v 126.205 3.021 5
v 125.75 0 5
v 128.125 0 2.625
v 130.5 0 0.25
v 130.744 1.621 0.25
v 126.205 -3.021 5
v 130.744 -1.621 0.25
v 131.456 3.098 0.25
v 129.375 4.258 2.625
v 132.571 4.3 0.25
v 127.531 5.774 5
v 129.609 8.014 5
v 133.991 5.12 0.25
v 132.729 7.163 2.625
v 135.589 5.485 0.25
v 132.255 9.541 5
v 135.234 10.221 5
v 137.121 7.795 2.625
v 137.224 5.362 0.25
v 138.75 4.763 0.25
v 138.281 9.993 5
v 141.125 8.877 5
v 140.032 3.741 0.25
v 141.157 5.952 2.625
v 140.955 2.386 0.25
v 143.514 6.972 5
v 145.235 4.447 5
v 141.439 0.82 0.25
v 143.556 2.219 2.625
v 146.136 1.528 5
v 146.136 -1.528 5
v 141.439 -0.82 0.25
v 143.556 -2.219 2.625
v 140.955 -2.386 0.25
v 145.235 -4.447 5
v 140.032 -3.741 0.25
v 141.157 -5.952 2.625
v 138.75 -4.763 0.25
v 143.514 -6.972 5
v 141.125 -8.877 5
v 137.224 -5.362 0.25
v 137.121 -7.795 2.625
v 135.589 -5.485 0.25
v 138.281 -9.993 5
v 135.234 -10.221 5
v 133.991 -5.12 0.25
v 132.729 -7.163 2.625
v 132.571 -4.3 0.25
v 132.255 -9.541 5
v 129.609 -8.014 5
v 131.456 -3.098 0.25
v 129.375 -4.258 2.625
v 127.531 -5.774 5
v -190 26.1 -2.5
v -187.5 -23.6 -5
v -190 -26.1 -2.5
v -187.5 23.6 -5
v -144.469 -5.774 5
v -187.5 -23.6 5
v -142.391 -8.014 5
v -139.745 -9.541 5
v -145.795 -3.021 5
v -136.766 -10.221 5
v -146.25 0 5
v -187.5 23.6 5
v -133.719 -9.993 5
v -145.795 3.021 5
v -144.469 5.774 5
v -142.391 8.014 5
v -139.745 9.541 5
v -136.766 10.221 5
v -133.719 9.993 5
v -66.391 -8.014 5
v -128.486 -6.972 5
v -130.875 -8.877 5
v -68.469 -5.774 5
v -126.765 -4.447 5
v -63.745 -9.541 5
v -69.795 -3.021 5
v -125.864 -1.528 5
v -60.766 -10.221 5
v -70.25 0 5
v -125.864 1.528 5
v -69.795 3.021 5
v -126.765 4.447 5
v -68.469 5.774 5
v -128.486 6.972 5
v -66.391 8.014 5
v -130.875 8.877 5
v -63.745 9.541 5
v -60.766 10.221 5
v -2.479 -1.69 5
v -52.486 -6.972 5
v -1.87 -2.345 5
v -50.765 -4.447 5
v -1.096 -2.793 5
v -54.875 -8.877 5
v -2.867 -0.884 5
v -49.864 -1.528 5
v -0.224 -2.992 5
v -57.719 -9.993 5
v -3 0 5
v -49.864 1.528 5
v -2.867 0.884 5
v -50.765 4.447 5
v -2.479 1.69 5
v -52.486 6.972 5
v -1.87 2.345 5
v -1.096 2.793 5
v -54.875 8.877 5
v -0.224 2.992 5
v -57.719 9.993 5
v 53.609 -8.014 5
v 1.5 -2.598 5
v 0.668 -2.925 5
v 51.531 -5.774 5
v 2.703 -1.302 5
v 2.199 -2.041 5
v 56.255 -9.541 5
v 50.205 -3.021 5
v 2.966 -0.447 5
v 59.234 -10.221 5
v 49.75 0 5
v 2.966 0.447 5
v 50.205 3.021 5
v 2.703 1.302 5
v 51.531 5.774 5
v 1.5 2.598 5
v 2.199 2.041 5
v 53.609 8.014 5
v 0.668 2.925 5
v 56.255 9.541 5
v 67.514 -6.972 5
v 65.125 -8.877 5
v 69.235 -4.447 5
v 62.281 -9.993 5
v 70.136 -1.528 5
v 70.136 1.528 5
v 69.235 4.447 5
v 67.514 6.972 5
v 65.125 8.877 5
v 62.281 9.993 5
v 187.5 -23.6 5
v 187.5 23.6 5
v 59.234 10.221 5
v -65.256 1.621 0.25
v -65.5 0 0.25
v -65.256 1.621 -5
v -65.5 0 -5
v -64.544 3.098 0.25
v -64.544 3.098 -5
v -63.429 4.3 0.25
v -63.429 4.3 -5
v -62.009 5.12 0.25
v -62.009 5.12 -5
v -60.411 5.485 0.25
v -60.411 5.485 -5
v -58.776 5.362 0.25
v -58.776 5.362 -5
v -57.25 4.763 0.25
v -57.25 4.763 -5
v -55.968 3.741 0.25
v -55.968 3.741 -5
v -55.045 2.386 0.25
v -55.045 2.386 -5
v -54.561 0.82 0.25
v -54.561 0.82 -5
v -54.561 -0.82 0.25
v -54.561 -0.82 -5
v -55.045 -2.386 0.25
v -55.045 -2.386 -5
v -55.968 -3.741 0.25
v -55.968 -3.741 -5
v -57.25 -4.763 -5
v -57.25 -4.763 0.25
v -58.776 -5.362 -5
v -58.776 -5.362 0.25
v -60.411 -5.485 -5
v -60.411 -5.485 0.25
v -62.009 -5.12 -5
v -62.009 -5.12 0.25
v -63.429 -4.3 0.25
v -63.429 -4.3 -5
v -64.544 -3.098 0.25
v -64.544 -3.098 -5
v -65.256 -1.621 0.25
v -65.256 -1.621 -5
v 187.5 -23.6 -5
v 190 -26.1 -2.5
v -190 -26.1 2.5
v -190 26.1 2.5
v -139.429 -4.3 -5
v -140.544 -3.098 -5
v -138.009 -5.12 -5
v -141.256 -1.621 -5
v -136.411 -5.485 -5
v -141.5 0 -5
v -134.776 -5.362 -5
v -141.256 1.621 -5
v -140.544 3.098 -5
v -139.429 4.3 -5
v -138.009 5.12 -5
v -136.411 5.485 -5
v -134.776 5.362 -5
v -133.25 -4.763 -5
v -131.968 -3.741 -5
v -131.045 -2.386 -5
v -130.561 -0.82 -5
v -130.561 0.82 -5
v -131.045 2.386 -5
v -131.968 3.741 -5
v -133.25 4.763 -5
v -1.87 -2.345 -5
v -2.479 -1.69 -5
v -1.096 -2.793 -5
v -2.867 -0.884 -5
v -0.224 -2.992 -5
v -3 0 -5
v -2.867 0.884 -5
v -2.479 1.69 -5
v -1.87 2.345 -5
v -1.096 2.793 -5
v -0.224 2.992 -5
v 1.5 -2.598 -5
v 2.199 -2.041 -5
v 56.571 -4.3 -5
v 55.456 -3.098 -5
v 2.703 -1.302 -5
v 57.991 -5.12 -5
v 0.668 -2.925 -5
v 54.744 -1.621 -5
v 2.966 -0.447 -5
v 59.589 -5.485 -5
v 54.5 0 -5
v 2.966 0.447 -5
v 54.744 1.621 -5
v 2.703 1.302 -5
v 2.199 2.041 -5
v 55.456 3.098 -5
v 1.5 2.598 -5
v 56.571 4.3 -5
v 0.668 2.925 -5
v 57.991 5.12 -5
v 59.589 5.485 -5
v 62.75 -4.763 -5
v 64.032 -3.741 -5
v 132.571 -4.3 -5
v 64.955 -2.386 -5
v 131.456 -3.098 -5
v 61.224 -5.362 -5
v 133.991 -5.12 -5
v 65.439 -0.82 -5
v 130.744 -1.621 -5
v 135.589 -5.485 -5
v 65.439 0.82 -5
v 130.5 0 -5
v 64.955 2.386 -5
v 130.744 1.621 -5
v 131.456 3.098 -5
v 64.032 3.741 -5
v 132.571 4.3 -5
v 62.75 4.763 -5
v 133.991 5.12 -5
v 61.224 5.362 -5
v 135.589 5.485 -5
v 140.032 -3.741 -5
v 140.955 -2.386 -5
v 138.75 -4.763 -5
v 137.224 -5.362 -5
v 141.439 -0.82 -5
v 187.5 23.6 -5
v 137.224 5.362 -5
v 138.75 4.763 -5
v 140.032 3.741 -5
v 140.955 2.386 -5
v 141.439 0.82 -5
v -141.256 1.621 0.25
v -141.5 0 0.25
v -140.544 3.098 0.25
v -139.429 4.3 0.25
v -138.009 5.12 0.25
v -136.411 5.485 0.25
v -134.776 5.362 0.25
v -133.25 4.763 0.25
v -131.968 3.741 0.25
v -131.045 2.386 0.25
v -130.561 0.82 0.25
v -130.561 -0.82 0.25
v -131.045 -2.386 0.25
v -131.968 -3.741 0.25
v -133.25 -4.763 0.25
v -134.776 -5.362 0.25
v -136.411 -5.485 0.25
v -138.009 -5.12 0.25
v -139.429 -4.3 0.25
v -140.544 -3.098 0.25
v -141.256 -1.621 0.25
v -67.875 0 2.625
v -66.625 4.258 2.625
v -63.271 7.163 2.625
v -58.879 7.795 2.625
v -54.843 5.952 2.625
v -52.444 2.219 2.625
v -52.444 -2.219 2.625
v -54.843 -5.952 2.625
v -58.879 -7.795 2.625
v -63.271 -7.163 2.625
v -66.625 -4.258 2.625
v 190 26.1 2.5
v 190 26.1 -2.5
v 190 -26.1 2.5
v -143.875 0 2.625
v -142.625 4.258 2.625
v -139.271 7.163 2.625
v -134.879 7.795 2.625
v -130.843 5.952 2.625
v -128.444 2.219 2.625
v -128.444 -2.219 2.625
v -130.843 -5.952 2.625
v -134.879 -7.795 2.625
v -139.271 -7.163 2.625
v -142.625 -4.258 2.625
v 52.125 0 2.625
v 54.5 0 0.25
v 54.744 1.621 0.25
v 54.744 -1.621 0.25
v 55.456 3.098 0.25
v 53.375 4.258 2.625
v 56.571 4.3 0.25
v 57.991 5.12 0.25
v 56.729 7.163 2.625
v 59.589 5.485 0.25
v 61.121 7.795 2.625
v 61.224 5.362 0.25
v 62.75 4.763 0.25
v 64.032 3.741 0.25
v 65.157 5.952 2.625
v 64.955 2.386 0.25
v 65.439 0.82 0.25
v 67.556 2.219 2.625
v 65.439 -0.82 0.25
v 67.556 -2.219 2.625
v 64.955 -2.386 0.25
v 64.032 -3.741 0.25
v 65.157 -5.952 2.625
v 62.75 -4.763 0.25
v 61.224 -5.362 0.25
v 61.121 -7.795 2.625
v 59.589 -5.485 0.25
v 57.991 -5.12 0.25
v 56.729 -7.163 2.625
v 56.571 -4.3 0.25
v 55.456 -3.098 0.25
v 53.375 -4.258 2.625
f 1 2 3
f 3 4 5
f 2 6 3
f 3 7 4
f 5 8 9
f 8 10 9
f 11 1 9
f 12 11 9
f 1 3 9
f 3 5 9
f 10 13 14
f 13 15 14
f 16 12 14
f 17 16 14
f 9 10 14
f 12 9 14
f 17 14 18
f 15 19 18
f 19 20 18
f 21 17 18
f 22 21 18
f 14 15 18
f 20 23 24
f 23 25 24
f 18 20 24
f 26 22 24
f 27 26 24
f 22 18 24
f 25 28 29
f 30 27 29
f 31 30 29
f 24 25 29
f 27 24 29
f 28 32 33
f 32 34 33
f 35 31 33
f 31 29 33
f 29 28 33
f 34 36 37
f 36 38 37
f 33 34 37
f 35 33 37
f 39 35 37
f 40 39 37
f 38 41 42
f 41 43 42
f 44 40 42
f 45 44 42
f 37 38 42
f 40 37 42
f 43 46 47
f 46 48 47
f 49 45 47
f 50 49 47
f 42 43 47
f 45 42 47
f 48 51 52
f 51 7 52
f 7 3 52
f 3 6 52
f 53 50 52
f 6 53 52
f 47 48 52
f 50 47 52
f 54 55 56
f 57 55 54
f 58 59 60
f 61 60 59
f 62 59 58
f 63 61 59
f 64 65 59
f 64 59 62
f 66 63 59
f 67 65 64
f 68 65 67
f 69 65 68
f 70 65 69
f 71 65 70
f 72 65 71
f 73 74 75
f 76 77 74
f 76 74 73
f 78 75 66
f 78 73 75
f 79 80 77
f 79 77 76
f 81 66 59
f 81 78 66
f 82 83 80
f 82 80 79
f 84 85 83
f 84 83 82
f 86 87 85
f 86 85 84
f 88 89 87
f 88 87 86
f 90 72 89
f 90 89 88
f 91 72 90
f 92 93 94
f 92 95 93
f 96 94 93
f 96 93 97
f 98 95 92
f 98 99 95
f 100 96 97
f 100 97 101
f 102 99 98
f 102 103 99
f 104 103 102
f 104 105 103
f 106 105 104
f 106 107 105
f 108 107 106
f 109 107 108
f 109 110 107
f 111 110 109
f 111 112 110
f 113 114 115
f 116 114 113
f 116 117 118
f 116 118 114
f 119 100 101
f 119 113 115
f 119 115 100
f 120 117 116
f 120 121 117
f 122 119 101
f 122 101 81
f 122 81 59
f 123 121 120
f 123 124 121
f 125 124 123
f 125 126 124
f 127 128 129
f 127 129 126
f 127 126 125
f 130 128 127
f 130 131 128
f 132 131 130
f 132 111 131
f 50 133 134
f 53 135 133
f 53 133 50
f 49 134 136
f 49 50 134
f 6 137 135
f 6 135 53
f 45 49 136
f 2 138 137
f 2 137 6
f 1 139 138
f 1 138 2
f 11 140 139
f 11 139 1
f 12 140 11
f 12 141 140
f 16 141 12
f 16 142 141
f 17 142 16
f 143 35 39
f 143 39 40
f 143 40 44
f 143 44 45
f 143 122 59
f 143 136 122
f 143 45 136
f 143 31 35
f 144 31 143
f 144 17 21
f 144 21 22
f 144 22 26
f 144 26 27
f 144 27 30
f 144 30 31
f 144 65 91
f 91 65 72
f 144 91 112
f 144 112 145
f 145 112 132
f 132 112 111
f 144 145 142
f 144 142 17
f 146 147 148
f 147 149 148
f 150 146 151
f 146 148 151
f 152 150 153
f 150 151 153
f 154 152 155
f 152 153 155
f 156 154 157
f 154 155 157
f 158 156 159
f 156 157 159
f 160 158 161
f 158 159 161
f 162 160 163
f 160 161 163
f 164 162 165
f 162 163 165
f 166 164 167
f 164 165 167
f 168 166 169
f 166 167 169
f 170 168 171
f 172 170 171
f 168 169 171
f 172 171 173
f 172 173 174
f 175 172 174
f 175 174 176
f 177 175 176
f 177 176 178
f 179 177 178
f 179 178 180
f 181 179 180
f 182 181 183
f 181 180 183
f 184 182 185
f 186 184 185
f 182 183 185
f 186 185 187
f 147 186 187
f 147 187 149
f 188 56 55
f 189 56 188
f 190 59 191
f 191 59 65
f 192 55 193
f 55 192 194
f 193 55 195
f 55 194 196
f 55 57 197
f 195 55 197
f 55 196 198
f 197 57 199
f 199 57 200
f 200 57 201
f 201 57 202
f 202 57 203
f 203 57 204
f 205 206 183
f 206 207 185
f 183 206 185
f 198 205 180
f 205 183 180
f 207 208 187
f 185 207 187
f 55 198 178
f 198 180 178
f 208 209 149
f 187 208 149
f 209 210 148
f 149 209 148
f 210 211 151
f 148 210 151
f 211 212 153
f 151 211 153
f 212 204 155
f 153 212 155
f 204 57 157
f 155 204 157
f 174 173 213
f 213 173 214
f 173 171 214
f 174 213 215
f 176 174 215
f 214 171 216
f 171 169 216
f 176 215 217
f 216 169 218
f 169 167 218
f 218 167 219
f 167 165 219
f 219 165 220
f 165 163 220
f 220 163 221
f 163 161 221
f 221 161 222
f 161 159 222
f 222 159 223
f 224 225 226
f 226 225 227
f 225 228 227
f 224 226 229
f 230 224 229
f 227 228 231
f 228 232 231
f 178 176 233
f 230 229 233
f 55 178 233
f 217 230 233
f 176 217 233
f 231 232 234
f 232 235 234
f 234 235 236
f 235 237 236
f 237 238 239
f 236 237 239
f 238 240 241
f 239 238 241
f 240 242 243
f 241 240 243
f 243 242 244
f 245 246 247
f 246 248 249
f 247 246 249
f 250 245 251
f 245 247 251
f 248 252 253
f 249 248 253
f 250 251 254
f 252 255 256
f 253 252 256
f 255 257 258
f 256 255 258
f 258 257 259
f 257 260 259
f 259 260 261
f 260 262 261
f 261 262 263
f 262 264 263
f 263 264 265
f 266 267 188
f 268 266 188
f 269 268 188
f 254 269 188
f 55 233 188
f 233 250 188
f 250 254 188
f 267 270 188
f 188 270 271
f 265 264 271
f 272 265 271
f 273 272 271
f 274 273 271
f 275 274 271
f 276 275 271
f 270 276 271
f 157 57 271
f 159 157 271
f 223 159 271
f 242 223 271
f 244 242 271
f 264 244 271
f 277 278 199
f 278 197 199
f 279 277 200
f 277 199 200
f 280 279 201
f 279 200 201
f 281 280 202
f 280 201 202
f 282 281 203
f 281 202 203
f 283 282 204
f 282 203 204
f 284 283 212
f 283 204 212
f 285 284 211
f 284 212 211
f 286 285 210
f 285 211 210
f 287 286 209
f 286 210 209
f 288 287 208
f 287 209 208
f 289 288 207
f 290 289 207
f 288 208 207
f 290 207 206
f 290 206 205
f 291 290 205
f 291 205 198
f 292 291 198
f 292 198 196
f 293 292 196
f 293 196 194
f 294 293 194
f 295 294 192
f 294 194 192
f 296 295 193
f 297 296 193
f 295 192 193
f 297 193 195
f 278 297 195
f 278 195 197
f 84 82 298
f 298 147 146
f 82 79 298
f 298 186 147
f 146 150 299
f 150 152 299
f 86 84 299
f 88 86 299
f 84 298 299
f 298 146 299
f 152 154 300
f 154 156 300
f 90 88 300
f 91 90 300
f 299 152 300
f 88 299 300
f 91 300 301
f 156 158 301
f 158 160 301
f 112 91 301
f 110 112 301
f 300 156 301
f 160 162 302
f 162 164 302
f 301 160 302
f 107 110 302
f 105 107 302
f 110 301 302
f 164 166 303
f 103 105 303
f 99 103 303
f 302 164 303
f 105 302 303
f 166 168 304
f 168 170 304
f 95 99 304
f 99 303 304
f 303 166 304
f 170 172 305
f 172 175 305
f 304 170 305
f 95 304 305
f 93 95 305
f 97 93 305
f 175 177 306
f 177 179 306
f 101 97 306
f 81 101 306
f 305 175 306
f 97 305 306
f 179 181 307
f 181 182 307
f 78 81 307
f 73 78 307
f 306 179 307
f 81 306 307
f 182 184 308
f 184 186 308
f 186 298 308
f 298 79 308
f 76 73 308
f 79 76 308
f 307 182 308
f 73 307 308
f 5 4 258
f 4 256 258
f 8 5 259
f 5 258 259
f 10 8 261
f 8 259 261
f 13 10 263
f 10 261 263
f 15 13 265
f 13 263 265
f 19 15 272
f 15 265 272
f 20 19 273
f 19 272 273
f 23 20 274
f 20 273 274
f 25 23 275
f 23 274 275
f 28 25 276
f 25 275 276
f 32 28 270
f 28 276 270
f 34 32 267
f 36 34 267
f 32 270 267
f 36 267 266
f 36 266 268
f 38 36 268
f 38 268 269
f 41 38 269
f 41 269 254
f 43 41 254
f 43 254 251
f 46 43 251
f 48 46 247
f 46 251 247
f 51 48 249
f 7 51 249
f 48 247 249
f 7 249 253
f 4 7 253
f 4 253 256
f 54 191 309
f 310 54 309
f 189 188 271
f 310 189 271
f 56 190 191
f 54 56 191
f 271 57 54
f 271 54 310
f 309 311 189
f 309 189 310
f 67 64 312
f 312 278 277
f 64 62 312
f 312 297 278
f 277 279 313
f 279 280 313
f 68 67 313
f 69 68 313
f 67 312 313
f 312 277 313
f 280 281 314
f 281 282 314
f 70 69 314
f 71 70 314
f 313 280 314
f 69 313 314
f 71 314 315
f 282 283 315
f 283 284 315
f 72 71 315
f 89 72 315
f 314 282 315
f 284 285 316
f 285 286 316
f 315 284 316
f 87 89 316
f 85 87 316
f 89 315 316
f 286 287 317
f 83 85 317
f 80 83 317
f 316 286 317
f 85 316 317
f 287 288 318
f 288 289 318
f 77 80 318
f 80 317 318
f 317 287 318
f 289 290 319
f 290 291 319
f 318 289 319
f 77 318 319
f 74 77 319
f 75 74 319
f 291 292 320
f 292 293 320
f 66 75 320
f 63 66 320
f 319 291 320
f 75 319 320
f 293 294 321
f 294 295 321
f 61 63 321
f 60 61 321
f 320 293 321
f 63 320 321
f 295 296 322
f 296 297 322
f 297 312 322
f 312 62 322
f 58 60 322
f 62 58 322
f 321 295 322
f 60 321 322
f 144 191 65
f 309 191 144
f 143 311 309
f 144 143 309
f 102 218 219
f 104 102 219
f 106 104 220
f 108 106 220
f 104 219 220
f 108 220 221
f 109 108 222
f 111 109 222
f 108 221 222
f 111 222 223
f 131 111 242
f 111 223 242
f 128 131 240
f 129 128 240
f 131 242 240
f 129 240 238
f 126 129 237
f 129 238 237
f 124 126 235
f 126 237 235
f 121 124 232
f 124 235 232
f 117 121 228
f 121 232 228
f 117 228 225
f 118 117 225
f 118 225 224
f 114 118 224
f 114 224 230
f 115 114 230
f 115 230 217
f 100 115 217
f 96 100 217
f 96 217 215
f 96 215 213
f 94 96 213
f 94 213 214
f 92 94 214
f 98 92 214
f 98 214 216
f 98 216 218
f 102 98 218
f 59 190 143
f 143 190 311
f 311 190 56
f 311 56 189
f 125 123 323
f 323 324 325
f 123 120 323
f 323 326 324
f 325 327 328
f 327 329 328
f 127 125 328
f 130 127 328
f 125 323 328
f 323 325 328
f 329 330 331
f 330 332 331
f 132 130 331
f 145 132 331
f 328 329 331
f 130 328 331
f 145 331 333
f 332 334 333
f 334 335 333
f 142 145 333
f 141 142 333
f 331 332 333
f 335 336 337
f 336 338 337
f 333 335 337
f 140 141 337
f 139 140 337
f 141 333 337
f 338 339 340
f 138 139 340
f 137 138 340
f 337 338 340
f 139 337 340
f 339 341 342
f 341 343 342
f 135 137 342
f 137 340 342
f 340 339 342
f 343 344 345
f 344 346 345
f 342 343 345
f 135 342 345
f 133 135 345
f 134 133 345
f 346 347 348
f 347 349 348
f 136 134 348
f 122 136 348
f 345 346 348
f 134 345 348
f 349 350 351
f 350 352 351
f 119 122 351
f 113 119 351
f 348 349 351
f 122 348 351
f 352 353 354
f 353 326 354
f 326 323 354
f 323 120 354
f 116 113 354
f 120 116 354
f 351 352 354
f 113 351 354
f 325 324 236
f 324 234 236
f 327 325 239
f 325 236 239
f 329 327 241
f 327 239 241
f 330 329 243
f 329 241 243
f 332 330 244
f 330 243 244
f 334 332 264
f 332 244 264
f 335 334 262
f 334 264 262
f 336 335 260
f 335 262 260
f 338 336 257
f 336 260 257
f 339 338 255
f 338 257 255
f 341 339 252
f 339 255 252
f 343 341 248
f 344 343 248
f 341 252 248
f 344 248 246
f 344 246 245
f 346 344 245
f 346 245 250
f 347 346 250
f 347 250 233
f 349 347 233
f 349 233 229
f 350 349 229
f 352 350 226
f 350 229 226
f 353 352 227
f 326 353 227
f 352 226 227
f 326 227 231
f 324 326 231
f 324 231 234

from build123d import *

# Parameters (mm, degrees)
F0_W           = 380
F0_H           = 52.2
F1_DEPTH       = 5
F2_SIZE        = 2.5
F4_D           = 6
F5_D           = 11
F5_CSINK_D     = 20.5
F5_CSINK_ANGLE = 90


with BuildPart() as f1:
    # F0 (on Top) → F1 (new body, symmetric)
    with BuildSketch(Plane.XY):
        Rectangle(F0_W, F0_H)
    extrude(amount=F1_DEPTH, both=True)

    # F2
    f2_edges = [f1.edges().sort_by_distance(p)[0] for p in [
        (0, 26.1, 5),
        (-190, 0, 5),
        (0, -26.1, 5),
        (190, 0, 5),
        (0, 26.1, -5),
        (-190, 0, -5),
        (0, -26.1, -5),
        (190, 0, -5),
    ]]
    chamfer(f2_edges, length=F2_SIZE)

    # F4 (through all)
    with Locations(Plane.XY.offset(5)):
        with Locations((0, 0)):
            Hole(F4_D / 2)

    # F5 (through all)
    with Locations(Plane.XY.offset(5)):
        with Locations((-136, 0), (-60, 0), (60, 0), (136, 0)):
            CounterSinkHole(F5_D / 2, F5_CSINK_D / 2, counter_sink_angle=F5_CSINK_ANGLE)


solid = f1.part
